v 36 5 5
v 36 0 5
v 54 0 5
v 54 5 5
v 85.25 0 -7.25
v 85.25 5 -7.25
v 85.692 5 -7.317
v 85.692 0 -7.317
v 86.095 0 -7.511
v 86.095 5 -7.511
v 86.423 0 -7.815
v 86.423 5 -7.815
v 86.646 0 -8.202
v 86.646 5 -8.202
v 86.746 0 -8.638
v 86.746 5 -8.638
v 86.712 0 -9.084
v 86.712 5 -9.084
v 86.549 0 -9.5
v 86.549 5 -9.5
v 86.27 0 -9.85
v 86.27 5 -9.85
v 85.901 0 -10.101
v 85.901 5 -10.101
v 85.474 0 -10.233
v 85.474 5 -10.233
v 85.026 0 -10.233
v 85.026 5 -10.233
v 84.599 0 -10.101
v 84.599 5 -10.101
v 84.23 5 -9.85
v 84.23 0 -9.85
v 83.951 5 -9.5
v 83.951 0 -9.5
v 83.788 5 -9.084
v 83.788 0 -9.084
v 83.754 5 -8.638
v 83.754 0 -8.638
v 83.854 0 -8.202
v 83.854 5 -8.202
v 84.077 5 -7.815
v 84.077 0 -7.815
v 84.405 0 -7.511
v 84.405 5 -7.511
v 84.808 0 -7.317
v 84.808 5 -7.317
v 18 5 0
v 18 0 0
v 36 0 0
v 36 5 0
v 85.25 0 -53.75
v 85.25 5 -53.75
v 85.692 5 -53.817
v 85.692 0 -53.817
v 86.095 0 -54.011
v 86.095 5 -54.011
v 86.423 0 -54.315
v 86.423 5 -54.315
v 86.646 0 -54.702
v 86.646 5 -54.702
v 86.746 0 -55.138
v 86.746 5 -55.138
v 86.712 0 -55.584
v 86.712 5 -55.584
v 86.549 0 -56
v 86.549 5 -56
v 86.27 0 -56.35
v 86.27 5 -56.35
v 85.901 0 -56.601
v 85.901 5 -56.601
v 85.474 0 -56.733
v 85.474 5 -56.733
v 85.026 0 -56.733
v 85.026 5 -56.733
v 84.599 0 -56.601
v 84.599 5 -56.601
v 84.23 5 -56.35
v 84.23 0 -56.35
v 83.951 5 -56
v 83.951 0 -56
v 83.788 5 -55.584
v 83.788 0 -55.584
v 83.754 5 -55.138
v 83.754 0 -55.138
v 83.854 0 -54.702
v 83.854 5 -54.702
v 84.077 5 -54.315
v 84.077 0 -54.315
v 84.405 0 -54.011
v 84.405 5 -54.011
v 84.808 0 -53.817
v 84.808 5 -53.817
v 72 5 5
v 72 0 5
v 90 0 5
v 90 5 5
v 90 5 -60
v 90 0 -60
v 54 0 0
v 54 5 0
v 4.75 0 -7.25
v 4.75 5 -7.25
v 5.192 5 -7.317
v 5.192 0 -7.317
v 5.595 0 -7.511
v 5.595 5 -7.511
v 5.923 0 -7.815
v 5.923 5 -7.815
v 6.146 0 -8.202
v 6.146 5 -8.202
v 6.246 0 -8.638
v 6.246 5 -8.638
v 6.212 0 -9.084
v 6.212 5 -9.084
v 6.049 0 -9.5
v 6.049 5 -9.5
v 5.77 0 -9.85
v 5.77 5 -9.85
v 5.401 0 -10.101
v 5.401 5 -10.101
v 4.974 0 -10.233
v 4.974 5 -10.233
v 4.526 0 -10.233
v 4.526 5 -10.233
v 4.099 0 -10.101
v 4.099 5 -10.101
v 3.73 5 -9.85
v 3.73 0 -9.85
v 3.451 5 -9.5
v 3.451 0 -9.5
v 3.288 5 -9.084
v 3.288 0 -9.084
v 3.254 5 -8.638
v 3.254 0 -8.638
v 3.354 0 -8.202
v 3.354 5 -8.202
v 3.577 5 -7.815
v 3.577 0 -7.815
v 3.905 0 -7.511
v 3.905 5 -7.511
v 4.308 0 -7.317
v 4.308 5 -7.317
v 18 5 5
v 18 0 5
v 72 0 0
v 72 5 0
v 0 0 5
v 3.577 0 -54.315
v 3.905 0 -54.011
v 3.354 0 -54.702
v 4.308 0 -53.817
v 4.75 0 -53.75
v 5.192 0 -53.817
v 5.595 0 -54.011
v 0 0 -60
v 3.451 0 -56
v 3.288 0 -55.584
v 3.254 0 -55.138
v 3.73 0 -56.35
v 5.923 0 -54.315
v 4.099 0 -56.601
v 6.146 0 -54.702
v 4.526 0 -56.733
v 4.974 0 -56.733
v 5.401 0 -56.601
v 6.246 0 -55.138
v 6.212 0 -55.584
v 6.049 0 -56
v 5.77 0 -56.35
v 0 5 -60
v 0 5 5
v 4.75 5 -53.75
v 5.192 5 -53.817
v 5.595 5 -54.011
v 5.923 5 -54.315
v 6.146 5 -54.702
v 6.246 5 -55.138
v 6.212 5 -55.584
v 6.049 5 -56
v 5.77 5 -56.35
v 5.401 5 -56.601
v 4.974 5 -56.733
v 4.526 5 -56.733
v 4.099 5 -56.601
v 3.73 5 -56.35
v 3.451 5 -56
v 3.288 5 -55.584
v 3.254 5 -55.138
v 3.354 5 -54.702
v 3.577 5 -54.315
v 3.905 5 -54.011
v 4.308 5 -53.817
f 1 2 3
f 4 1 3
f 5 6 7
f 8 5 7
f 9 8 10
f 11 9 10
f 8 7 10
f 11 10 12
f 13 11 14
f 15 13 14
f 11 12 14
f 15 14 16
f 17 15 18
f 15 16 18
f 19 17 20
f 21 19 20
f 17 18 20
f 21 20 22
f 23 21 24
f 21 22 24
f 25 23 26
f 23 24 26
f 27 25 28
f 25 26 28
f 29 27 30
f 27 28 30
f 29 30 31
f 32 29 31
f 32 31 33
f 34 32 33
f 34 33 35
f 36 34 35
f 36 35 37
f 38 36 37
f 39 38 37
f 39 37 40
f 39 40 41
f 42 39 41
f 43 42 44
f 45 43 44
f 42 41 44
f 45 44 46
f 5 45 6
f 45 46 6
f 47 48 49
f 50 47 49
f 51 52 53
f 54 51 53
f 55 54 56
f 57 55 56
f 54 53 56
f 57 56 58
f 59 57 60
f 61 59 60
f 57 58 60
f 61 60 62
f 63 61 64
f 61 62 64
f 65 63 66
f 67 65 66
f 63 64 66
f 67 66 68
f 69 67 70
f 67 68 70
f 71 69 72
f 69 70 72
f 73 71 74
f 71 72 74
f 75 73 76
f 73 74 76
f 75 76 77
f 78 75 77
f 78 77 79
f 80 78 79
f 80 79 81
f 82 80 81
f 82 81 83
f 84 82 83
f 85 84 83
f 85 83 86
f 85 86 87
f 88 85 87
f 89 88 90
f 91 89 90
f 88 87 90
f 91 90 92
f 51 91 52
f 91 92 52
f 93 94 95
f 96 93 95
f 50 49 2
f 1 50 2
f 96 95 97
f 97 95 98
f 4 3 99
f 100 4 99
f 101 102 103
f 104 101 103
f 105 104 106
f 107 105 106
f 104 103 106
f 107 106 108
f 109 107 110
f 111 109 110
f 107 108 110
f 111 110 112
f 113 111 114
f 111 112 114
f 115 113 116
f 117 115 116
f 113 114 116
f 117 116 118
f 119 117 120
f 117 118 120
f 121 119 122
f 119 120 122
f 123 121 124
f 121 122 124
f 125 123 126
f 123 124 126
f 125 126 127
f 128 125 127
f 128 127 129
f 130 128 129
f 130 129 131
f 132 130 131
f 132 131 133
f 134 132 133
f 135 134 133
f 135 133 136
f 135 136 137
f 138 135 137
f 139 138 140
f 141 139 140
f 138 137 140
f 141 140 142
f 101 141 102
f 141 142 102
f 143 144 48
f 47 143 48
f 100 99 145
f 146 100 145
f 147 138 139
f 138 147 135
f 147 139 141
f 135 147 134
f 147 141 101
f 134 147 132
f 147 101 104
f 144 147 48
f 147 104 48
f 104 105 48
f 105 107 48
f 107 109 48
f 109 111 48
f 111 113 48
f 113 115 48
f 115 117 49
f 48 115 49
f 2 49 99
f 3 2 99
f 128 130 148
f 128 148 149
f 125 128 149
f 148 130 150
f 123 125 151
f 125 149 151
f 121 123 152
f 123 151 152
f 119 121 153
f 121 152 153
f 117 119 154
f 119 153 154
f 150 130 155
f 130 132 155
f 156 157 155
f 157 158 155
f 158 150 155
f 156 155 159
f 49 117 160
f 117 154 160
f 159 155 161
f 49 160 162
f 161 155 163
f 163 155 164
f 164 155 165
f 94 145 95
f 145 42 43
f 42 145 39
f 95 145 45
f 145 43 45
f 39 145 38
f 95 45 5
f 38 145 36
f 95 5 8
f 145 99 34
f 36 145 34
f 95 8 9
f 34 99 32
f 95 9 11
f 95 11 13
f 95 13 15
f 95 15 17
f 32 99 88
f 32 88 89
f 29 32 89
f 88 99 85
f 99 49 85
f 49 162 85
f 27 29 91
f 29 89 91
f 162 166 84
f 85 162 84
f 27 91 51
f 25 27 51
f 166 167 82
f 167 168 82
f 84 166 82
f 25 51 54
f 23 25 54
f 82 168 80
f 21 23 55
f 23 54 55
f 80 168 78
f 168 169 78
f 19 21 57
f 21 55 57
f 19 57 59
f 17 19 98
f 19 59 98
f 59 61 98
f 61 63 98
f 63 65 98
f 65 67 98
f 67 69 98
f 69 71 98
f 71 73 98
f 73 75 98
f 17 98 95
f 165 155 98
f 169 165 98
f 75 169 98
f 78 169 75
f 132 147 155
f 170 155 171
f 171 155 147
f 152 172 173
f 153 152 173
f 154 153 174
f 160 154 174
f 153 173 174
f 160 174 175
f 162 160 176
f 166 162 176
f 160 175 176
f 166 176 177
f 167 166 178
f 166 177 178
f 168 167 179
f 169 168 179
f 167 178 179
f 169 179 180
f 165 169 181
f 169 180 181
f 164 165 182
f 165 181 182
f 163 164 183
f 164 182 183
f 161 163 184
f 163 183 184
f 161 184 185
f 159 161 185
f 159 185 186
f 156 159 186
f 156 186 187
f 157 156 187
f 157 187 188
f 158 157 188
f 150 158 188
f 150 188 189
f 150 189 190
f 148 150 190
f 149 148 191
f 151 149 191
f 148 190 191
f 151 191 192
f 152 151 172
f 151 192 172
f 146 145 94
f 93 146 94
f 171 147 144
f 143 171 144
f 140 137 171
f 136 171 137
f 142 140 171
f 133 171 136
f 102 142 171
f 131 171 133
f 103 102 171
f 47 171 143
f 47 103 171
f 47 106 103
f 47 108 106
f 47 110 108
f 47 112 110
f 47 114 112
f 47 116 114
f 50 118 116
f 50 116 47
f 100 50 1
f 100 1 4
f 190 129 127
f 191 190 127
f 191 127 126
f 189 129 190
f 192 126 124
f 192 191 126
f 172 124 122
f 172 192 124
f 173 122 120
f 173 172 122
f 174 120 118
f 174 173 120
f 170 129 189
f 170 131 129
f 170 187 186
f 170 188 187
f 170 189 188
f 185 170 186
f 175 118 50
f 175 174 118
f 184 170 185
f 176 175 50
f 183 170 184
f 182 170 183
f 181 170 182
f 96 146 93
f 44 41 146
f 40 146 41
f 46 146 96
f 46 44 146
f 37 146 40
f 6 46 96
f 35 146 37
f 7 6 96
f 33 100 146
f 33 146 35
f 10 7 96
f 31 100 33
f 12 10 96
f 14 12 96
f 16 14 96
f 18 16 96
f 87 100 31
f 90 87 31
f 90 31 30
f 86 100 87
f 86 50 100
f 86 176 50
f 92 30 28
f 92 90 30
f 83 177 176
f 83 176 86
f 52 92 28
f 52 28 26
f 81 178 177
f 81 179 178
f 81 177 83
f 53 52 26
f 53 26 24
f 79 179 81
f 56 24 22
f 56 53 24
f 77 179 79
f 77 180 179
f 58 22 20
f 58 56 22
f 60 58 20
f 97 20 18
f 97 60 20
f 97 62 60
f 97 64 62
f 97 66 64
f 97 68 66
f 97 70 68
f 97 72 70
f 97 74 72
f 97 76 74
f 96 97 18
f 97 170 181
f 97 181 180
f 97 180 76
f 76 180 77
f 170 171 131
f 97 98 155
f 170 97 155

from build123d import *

# Parameters (mm, degrees)
BOSS_EXTRUDE1_DEPTH = 5
SKETCH2_R           = 1.5
CUT_EXTRUDE1_DEPTH  = 5


with BuildPart() as part:
    # Sketch1 → Boss-Extrude1 (new body)
    with BuildSketch(Plane(origin=(0, 0, 0), x_dir=(1, 0, 0), z_dir=(0, 1, 0))):
        Polygon((54, 0), (72, 0), (72, -5), (90, -5), (90, 0), (90, 60), (0, 60), (0, 0), (0, -5), (18, -5), (18, 0), (36, 0), (36, -5), (54, -5), align=None)
    extrude(amount=BOSS_EXTRUDE1_DEPTH)

    # Sketch2 → Cut-Extrude1 (cut)
    with BuildSketch(Plane(origin=(0, 5, 0), x_dir=(1, 0, 0), z_dir=(0, 1, 0))):
        with Locations(Location((4.75, 55.25, 0), (0, 0, 270))):
            Circle(SKETCH2_R)
        with Locations(Location((85.25, 55.25, 0), (0, 0, 270))):
            Circle(SKETCH2_R)
        with Locations(Location((85.25, 8.75, 0), (0, 0, 270))):
            Circle(SKETCH2_R)
        with Locations(Location((4.75, 8.75, 0), (0, 0, 270))):
            Circle(SKETCH2_R)
    extrude(amount=-CUT_EXTRUDE1_DEPTH, mode=Mode.SUBTRACT)


solid = part.part
